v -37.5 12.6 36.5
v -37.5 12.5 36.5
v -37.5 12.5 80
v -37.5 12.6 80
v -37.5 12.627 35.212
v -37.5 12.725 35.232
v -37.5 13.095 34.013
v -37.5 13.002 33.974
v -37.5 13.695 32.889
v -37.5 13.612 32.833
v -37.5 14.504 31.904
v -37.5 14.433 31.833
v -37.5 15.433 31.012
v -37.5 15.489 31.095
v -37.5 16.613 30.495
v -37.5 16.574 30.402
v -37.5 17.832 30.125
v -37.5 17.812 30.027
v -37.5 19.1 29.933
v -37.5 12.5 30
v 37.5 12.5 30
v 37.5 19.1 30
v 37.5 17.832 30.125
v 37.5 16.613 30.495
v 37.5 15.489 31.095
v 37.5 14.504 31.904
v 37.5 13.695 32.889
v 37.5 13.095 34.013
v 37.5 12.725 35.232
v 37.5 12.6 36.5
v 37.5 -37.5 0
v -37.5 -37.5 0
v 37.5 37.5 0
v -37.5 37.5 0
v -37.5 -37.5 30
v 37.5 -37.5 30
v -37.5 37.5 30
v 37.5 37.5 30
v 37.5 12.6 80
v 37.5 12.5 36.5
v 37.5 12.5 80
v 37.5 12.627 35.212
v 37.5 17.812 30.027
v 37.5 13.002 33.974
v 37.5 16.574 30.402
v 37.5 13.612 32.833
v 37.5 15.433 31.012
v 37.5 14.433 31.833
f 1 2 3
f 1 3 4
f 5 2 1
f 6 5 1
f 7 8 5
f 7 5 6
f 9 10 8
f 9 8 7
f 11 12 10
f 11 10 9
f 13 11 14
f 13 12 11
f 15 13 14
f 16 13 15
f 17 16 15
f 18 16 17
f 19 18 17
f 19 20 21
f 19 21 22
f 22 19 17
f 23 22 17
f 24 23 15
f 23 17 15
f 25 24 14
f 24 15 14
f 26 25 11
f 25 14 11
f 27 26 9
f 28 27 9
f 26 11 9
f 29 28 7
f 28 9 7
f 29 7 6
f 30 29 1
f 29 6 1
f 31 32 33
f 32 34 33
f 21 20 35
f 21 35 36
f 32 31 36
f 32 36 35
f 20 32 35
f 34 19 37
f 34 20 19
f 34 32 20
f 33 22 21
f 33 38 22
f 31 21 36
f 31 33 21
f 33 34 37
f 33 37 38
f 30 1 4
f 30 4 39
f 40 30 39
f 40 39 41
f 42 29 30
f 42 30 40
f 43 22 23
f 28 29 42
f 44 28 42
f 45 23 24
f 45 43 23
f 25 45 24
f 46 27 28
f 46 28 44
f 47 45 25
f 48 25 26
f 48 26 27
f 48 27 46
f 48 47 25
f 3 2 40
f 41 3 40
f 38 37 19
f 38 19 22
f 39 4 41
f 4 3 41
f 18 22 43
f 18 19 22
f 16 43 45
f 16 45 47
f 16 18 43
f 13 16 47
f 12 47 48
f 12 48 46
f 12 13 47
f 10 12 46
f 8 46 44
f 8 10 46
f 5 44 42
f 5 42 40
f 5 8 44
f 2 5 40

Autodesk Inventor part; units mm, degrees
ref_plane "YZ Plane" through (0, 0, 0) normal (1, 0, 0) x (0, 1, 0)
ref_plane "XZ Plane" through (0, 0, 0) normal (0, 1, 0) x (-1, 0, 0)
sketch "草图1" plane through (0, 0, 0) normal (0, 0, 1) x (1, 0, 0)
  line L0 (37.5, -37.5) -> (-37.5, -37.5)
  line L1 (-37.5, -37.5) -> (-37.5, 37.5)
  line L2 (-37.5, 37.5) -> (37.5, 37.5)
  line L3 (37.5, 37.5) -> (37.5, -37.5)
  line L4 (37.5, -37.5) -> (-37.5, 37.5) construction
  line L5 (-37.5, -37.5) -> (37.5, 37.5) construction
  point P0 (0, 0)
  dimension "d0" = 75
  dimension "d1" = 75
extrude "拉伸1" add sketch "草图1" along normal blind 30
sketch "草图2" plane through (-37.5, 37.5, 0) normal (0, 1, 0) x (1, 0, 0)
  point P0 (37.5, 0)
ref_plane "工作平面1" through (-37.5, 12.5, 0) normal (0, 1, 0) x (1, 0, 0)
sketch "草图3" plane through (-37.5, 12.5, 0) normal (0, 1, 0) x (1, 0, 0)
  line L0 (75, -30) -> (0, -30) projected
  line L1 (75, -30) -> (0, -30)
  line L2 (0, -30) -> (0, -80)
  line L3 (0, -80) -> (75, -80)
  line L4 (75, -80) -> (75, -30)
  line L5 (0, 0) -> (0, -30) projected
  point P0 (37.5, 0)
  dimension "d5" = 50
extrude "拉伸2" add sketch "草图3" along normal blind 0.1
fillet "圆角1" radius 6.5 1 edges at (0, 12.6, 30)
sketch "草图4" plane through (-37.5, -37.5, 0) normal (-1, 0, 0) x (0, 0, 1)
  arc A0 (30, 56.6) -> (36.5, 50.1) centre (36.5, 56.6) ccw projected
  circle A1 centre (36.5, 56.6) radius 6.6
  line L0 (80, 50) -> (30, 50) projected
  line L1 (30, 50) -> (29.9, 56.6)
  point P0 (0, 37.5)
  point P1 (29.903, 56.4)
  point P2 (36.5, 50)
extrude "拉伸3" cut sketch "草图4" against normal blind 112.5 contours A1 L0 L1
properties part number "便签"
